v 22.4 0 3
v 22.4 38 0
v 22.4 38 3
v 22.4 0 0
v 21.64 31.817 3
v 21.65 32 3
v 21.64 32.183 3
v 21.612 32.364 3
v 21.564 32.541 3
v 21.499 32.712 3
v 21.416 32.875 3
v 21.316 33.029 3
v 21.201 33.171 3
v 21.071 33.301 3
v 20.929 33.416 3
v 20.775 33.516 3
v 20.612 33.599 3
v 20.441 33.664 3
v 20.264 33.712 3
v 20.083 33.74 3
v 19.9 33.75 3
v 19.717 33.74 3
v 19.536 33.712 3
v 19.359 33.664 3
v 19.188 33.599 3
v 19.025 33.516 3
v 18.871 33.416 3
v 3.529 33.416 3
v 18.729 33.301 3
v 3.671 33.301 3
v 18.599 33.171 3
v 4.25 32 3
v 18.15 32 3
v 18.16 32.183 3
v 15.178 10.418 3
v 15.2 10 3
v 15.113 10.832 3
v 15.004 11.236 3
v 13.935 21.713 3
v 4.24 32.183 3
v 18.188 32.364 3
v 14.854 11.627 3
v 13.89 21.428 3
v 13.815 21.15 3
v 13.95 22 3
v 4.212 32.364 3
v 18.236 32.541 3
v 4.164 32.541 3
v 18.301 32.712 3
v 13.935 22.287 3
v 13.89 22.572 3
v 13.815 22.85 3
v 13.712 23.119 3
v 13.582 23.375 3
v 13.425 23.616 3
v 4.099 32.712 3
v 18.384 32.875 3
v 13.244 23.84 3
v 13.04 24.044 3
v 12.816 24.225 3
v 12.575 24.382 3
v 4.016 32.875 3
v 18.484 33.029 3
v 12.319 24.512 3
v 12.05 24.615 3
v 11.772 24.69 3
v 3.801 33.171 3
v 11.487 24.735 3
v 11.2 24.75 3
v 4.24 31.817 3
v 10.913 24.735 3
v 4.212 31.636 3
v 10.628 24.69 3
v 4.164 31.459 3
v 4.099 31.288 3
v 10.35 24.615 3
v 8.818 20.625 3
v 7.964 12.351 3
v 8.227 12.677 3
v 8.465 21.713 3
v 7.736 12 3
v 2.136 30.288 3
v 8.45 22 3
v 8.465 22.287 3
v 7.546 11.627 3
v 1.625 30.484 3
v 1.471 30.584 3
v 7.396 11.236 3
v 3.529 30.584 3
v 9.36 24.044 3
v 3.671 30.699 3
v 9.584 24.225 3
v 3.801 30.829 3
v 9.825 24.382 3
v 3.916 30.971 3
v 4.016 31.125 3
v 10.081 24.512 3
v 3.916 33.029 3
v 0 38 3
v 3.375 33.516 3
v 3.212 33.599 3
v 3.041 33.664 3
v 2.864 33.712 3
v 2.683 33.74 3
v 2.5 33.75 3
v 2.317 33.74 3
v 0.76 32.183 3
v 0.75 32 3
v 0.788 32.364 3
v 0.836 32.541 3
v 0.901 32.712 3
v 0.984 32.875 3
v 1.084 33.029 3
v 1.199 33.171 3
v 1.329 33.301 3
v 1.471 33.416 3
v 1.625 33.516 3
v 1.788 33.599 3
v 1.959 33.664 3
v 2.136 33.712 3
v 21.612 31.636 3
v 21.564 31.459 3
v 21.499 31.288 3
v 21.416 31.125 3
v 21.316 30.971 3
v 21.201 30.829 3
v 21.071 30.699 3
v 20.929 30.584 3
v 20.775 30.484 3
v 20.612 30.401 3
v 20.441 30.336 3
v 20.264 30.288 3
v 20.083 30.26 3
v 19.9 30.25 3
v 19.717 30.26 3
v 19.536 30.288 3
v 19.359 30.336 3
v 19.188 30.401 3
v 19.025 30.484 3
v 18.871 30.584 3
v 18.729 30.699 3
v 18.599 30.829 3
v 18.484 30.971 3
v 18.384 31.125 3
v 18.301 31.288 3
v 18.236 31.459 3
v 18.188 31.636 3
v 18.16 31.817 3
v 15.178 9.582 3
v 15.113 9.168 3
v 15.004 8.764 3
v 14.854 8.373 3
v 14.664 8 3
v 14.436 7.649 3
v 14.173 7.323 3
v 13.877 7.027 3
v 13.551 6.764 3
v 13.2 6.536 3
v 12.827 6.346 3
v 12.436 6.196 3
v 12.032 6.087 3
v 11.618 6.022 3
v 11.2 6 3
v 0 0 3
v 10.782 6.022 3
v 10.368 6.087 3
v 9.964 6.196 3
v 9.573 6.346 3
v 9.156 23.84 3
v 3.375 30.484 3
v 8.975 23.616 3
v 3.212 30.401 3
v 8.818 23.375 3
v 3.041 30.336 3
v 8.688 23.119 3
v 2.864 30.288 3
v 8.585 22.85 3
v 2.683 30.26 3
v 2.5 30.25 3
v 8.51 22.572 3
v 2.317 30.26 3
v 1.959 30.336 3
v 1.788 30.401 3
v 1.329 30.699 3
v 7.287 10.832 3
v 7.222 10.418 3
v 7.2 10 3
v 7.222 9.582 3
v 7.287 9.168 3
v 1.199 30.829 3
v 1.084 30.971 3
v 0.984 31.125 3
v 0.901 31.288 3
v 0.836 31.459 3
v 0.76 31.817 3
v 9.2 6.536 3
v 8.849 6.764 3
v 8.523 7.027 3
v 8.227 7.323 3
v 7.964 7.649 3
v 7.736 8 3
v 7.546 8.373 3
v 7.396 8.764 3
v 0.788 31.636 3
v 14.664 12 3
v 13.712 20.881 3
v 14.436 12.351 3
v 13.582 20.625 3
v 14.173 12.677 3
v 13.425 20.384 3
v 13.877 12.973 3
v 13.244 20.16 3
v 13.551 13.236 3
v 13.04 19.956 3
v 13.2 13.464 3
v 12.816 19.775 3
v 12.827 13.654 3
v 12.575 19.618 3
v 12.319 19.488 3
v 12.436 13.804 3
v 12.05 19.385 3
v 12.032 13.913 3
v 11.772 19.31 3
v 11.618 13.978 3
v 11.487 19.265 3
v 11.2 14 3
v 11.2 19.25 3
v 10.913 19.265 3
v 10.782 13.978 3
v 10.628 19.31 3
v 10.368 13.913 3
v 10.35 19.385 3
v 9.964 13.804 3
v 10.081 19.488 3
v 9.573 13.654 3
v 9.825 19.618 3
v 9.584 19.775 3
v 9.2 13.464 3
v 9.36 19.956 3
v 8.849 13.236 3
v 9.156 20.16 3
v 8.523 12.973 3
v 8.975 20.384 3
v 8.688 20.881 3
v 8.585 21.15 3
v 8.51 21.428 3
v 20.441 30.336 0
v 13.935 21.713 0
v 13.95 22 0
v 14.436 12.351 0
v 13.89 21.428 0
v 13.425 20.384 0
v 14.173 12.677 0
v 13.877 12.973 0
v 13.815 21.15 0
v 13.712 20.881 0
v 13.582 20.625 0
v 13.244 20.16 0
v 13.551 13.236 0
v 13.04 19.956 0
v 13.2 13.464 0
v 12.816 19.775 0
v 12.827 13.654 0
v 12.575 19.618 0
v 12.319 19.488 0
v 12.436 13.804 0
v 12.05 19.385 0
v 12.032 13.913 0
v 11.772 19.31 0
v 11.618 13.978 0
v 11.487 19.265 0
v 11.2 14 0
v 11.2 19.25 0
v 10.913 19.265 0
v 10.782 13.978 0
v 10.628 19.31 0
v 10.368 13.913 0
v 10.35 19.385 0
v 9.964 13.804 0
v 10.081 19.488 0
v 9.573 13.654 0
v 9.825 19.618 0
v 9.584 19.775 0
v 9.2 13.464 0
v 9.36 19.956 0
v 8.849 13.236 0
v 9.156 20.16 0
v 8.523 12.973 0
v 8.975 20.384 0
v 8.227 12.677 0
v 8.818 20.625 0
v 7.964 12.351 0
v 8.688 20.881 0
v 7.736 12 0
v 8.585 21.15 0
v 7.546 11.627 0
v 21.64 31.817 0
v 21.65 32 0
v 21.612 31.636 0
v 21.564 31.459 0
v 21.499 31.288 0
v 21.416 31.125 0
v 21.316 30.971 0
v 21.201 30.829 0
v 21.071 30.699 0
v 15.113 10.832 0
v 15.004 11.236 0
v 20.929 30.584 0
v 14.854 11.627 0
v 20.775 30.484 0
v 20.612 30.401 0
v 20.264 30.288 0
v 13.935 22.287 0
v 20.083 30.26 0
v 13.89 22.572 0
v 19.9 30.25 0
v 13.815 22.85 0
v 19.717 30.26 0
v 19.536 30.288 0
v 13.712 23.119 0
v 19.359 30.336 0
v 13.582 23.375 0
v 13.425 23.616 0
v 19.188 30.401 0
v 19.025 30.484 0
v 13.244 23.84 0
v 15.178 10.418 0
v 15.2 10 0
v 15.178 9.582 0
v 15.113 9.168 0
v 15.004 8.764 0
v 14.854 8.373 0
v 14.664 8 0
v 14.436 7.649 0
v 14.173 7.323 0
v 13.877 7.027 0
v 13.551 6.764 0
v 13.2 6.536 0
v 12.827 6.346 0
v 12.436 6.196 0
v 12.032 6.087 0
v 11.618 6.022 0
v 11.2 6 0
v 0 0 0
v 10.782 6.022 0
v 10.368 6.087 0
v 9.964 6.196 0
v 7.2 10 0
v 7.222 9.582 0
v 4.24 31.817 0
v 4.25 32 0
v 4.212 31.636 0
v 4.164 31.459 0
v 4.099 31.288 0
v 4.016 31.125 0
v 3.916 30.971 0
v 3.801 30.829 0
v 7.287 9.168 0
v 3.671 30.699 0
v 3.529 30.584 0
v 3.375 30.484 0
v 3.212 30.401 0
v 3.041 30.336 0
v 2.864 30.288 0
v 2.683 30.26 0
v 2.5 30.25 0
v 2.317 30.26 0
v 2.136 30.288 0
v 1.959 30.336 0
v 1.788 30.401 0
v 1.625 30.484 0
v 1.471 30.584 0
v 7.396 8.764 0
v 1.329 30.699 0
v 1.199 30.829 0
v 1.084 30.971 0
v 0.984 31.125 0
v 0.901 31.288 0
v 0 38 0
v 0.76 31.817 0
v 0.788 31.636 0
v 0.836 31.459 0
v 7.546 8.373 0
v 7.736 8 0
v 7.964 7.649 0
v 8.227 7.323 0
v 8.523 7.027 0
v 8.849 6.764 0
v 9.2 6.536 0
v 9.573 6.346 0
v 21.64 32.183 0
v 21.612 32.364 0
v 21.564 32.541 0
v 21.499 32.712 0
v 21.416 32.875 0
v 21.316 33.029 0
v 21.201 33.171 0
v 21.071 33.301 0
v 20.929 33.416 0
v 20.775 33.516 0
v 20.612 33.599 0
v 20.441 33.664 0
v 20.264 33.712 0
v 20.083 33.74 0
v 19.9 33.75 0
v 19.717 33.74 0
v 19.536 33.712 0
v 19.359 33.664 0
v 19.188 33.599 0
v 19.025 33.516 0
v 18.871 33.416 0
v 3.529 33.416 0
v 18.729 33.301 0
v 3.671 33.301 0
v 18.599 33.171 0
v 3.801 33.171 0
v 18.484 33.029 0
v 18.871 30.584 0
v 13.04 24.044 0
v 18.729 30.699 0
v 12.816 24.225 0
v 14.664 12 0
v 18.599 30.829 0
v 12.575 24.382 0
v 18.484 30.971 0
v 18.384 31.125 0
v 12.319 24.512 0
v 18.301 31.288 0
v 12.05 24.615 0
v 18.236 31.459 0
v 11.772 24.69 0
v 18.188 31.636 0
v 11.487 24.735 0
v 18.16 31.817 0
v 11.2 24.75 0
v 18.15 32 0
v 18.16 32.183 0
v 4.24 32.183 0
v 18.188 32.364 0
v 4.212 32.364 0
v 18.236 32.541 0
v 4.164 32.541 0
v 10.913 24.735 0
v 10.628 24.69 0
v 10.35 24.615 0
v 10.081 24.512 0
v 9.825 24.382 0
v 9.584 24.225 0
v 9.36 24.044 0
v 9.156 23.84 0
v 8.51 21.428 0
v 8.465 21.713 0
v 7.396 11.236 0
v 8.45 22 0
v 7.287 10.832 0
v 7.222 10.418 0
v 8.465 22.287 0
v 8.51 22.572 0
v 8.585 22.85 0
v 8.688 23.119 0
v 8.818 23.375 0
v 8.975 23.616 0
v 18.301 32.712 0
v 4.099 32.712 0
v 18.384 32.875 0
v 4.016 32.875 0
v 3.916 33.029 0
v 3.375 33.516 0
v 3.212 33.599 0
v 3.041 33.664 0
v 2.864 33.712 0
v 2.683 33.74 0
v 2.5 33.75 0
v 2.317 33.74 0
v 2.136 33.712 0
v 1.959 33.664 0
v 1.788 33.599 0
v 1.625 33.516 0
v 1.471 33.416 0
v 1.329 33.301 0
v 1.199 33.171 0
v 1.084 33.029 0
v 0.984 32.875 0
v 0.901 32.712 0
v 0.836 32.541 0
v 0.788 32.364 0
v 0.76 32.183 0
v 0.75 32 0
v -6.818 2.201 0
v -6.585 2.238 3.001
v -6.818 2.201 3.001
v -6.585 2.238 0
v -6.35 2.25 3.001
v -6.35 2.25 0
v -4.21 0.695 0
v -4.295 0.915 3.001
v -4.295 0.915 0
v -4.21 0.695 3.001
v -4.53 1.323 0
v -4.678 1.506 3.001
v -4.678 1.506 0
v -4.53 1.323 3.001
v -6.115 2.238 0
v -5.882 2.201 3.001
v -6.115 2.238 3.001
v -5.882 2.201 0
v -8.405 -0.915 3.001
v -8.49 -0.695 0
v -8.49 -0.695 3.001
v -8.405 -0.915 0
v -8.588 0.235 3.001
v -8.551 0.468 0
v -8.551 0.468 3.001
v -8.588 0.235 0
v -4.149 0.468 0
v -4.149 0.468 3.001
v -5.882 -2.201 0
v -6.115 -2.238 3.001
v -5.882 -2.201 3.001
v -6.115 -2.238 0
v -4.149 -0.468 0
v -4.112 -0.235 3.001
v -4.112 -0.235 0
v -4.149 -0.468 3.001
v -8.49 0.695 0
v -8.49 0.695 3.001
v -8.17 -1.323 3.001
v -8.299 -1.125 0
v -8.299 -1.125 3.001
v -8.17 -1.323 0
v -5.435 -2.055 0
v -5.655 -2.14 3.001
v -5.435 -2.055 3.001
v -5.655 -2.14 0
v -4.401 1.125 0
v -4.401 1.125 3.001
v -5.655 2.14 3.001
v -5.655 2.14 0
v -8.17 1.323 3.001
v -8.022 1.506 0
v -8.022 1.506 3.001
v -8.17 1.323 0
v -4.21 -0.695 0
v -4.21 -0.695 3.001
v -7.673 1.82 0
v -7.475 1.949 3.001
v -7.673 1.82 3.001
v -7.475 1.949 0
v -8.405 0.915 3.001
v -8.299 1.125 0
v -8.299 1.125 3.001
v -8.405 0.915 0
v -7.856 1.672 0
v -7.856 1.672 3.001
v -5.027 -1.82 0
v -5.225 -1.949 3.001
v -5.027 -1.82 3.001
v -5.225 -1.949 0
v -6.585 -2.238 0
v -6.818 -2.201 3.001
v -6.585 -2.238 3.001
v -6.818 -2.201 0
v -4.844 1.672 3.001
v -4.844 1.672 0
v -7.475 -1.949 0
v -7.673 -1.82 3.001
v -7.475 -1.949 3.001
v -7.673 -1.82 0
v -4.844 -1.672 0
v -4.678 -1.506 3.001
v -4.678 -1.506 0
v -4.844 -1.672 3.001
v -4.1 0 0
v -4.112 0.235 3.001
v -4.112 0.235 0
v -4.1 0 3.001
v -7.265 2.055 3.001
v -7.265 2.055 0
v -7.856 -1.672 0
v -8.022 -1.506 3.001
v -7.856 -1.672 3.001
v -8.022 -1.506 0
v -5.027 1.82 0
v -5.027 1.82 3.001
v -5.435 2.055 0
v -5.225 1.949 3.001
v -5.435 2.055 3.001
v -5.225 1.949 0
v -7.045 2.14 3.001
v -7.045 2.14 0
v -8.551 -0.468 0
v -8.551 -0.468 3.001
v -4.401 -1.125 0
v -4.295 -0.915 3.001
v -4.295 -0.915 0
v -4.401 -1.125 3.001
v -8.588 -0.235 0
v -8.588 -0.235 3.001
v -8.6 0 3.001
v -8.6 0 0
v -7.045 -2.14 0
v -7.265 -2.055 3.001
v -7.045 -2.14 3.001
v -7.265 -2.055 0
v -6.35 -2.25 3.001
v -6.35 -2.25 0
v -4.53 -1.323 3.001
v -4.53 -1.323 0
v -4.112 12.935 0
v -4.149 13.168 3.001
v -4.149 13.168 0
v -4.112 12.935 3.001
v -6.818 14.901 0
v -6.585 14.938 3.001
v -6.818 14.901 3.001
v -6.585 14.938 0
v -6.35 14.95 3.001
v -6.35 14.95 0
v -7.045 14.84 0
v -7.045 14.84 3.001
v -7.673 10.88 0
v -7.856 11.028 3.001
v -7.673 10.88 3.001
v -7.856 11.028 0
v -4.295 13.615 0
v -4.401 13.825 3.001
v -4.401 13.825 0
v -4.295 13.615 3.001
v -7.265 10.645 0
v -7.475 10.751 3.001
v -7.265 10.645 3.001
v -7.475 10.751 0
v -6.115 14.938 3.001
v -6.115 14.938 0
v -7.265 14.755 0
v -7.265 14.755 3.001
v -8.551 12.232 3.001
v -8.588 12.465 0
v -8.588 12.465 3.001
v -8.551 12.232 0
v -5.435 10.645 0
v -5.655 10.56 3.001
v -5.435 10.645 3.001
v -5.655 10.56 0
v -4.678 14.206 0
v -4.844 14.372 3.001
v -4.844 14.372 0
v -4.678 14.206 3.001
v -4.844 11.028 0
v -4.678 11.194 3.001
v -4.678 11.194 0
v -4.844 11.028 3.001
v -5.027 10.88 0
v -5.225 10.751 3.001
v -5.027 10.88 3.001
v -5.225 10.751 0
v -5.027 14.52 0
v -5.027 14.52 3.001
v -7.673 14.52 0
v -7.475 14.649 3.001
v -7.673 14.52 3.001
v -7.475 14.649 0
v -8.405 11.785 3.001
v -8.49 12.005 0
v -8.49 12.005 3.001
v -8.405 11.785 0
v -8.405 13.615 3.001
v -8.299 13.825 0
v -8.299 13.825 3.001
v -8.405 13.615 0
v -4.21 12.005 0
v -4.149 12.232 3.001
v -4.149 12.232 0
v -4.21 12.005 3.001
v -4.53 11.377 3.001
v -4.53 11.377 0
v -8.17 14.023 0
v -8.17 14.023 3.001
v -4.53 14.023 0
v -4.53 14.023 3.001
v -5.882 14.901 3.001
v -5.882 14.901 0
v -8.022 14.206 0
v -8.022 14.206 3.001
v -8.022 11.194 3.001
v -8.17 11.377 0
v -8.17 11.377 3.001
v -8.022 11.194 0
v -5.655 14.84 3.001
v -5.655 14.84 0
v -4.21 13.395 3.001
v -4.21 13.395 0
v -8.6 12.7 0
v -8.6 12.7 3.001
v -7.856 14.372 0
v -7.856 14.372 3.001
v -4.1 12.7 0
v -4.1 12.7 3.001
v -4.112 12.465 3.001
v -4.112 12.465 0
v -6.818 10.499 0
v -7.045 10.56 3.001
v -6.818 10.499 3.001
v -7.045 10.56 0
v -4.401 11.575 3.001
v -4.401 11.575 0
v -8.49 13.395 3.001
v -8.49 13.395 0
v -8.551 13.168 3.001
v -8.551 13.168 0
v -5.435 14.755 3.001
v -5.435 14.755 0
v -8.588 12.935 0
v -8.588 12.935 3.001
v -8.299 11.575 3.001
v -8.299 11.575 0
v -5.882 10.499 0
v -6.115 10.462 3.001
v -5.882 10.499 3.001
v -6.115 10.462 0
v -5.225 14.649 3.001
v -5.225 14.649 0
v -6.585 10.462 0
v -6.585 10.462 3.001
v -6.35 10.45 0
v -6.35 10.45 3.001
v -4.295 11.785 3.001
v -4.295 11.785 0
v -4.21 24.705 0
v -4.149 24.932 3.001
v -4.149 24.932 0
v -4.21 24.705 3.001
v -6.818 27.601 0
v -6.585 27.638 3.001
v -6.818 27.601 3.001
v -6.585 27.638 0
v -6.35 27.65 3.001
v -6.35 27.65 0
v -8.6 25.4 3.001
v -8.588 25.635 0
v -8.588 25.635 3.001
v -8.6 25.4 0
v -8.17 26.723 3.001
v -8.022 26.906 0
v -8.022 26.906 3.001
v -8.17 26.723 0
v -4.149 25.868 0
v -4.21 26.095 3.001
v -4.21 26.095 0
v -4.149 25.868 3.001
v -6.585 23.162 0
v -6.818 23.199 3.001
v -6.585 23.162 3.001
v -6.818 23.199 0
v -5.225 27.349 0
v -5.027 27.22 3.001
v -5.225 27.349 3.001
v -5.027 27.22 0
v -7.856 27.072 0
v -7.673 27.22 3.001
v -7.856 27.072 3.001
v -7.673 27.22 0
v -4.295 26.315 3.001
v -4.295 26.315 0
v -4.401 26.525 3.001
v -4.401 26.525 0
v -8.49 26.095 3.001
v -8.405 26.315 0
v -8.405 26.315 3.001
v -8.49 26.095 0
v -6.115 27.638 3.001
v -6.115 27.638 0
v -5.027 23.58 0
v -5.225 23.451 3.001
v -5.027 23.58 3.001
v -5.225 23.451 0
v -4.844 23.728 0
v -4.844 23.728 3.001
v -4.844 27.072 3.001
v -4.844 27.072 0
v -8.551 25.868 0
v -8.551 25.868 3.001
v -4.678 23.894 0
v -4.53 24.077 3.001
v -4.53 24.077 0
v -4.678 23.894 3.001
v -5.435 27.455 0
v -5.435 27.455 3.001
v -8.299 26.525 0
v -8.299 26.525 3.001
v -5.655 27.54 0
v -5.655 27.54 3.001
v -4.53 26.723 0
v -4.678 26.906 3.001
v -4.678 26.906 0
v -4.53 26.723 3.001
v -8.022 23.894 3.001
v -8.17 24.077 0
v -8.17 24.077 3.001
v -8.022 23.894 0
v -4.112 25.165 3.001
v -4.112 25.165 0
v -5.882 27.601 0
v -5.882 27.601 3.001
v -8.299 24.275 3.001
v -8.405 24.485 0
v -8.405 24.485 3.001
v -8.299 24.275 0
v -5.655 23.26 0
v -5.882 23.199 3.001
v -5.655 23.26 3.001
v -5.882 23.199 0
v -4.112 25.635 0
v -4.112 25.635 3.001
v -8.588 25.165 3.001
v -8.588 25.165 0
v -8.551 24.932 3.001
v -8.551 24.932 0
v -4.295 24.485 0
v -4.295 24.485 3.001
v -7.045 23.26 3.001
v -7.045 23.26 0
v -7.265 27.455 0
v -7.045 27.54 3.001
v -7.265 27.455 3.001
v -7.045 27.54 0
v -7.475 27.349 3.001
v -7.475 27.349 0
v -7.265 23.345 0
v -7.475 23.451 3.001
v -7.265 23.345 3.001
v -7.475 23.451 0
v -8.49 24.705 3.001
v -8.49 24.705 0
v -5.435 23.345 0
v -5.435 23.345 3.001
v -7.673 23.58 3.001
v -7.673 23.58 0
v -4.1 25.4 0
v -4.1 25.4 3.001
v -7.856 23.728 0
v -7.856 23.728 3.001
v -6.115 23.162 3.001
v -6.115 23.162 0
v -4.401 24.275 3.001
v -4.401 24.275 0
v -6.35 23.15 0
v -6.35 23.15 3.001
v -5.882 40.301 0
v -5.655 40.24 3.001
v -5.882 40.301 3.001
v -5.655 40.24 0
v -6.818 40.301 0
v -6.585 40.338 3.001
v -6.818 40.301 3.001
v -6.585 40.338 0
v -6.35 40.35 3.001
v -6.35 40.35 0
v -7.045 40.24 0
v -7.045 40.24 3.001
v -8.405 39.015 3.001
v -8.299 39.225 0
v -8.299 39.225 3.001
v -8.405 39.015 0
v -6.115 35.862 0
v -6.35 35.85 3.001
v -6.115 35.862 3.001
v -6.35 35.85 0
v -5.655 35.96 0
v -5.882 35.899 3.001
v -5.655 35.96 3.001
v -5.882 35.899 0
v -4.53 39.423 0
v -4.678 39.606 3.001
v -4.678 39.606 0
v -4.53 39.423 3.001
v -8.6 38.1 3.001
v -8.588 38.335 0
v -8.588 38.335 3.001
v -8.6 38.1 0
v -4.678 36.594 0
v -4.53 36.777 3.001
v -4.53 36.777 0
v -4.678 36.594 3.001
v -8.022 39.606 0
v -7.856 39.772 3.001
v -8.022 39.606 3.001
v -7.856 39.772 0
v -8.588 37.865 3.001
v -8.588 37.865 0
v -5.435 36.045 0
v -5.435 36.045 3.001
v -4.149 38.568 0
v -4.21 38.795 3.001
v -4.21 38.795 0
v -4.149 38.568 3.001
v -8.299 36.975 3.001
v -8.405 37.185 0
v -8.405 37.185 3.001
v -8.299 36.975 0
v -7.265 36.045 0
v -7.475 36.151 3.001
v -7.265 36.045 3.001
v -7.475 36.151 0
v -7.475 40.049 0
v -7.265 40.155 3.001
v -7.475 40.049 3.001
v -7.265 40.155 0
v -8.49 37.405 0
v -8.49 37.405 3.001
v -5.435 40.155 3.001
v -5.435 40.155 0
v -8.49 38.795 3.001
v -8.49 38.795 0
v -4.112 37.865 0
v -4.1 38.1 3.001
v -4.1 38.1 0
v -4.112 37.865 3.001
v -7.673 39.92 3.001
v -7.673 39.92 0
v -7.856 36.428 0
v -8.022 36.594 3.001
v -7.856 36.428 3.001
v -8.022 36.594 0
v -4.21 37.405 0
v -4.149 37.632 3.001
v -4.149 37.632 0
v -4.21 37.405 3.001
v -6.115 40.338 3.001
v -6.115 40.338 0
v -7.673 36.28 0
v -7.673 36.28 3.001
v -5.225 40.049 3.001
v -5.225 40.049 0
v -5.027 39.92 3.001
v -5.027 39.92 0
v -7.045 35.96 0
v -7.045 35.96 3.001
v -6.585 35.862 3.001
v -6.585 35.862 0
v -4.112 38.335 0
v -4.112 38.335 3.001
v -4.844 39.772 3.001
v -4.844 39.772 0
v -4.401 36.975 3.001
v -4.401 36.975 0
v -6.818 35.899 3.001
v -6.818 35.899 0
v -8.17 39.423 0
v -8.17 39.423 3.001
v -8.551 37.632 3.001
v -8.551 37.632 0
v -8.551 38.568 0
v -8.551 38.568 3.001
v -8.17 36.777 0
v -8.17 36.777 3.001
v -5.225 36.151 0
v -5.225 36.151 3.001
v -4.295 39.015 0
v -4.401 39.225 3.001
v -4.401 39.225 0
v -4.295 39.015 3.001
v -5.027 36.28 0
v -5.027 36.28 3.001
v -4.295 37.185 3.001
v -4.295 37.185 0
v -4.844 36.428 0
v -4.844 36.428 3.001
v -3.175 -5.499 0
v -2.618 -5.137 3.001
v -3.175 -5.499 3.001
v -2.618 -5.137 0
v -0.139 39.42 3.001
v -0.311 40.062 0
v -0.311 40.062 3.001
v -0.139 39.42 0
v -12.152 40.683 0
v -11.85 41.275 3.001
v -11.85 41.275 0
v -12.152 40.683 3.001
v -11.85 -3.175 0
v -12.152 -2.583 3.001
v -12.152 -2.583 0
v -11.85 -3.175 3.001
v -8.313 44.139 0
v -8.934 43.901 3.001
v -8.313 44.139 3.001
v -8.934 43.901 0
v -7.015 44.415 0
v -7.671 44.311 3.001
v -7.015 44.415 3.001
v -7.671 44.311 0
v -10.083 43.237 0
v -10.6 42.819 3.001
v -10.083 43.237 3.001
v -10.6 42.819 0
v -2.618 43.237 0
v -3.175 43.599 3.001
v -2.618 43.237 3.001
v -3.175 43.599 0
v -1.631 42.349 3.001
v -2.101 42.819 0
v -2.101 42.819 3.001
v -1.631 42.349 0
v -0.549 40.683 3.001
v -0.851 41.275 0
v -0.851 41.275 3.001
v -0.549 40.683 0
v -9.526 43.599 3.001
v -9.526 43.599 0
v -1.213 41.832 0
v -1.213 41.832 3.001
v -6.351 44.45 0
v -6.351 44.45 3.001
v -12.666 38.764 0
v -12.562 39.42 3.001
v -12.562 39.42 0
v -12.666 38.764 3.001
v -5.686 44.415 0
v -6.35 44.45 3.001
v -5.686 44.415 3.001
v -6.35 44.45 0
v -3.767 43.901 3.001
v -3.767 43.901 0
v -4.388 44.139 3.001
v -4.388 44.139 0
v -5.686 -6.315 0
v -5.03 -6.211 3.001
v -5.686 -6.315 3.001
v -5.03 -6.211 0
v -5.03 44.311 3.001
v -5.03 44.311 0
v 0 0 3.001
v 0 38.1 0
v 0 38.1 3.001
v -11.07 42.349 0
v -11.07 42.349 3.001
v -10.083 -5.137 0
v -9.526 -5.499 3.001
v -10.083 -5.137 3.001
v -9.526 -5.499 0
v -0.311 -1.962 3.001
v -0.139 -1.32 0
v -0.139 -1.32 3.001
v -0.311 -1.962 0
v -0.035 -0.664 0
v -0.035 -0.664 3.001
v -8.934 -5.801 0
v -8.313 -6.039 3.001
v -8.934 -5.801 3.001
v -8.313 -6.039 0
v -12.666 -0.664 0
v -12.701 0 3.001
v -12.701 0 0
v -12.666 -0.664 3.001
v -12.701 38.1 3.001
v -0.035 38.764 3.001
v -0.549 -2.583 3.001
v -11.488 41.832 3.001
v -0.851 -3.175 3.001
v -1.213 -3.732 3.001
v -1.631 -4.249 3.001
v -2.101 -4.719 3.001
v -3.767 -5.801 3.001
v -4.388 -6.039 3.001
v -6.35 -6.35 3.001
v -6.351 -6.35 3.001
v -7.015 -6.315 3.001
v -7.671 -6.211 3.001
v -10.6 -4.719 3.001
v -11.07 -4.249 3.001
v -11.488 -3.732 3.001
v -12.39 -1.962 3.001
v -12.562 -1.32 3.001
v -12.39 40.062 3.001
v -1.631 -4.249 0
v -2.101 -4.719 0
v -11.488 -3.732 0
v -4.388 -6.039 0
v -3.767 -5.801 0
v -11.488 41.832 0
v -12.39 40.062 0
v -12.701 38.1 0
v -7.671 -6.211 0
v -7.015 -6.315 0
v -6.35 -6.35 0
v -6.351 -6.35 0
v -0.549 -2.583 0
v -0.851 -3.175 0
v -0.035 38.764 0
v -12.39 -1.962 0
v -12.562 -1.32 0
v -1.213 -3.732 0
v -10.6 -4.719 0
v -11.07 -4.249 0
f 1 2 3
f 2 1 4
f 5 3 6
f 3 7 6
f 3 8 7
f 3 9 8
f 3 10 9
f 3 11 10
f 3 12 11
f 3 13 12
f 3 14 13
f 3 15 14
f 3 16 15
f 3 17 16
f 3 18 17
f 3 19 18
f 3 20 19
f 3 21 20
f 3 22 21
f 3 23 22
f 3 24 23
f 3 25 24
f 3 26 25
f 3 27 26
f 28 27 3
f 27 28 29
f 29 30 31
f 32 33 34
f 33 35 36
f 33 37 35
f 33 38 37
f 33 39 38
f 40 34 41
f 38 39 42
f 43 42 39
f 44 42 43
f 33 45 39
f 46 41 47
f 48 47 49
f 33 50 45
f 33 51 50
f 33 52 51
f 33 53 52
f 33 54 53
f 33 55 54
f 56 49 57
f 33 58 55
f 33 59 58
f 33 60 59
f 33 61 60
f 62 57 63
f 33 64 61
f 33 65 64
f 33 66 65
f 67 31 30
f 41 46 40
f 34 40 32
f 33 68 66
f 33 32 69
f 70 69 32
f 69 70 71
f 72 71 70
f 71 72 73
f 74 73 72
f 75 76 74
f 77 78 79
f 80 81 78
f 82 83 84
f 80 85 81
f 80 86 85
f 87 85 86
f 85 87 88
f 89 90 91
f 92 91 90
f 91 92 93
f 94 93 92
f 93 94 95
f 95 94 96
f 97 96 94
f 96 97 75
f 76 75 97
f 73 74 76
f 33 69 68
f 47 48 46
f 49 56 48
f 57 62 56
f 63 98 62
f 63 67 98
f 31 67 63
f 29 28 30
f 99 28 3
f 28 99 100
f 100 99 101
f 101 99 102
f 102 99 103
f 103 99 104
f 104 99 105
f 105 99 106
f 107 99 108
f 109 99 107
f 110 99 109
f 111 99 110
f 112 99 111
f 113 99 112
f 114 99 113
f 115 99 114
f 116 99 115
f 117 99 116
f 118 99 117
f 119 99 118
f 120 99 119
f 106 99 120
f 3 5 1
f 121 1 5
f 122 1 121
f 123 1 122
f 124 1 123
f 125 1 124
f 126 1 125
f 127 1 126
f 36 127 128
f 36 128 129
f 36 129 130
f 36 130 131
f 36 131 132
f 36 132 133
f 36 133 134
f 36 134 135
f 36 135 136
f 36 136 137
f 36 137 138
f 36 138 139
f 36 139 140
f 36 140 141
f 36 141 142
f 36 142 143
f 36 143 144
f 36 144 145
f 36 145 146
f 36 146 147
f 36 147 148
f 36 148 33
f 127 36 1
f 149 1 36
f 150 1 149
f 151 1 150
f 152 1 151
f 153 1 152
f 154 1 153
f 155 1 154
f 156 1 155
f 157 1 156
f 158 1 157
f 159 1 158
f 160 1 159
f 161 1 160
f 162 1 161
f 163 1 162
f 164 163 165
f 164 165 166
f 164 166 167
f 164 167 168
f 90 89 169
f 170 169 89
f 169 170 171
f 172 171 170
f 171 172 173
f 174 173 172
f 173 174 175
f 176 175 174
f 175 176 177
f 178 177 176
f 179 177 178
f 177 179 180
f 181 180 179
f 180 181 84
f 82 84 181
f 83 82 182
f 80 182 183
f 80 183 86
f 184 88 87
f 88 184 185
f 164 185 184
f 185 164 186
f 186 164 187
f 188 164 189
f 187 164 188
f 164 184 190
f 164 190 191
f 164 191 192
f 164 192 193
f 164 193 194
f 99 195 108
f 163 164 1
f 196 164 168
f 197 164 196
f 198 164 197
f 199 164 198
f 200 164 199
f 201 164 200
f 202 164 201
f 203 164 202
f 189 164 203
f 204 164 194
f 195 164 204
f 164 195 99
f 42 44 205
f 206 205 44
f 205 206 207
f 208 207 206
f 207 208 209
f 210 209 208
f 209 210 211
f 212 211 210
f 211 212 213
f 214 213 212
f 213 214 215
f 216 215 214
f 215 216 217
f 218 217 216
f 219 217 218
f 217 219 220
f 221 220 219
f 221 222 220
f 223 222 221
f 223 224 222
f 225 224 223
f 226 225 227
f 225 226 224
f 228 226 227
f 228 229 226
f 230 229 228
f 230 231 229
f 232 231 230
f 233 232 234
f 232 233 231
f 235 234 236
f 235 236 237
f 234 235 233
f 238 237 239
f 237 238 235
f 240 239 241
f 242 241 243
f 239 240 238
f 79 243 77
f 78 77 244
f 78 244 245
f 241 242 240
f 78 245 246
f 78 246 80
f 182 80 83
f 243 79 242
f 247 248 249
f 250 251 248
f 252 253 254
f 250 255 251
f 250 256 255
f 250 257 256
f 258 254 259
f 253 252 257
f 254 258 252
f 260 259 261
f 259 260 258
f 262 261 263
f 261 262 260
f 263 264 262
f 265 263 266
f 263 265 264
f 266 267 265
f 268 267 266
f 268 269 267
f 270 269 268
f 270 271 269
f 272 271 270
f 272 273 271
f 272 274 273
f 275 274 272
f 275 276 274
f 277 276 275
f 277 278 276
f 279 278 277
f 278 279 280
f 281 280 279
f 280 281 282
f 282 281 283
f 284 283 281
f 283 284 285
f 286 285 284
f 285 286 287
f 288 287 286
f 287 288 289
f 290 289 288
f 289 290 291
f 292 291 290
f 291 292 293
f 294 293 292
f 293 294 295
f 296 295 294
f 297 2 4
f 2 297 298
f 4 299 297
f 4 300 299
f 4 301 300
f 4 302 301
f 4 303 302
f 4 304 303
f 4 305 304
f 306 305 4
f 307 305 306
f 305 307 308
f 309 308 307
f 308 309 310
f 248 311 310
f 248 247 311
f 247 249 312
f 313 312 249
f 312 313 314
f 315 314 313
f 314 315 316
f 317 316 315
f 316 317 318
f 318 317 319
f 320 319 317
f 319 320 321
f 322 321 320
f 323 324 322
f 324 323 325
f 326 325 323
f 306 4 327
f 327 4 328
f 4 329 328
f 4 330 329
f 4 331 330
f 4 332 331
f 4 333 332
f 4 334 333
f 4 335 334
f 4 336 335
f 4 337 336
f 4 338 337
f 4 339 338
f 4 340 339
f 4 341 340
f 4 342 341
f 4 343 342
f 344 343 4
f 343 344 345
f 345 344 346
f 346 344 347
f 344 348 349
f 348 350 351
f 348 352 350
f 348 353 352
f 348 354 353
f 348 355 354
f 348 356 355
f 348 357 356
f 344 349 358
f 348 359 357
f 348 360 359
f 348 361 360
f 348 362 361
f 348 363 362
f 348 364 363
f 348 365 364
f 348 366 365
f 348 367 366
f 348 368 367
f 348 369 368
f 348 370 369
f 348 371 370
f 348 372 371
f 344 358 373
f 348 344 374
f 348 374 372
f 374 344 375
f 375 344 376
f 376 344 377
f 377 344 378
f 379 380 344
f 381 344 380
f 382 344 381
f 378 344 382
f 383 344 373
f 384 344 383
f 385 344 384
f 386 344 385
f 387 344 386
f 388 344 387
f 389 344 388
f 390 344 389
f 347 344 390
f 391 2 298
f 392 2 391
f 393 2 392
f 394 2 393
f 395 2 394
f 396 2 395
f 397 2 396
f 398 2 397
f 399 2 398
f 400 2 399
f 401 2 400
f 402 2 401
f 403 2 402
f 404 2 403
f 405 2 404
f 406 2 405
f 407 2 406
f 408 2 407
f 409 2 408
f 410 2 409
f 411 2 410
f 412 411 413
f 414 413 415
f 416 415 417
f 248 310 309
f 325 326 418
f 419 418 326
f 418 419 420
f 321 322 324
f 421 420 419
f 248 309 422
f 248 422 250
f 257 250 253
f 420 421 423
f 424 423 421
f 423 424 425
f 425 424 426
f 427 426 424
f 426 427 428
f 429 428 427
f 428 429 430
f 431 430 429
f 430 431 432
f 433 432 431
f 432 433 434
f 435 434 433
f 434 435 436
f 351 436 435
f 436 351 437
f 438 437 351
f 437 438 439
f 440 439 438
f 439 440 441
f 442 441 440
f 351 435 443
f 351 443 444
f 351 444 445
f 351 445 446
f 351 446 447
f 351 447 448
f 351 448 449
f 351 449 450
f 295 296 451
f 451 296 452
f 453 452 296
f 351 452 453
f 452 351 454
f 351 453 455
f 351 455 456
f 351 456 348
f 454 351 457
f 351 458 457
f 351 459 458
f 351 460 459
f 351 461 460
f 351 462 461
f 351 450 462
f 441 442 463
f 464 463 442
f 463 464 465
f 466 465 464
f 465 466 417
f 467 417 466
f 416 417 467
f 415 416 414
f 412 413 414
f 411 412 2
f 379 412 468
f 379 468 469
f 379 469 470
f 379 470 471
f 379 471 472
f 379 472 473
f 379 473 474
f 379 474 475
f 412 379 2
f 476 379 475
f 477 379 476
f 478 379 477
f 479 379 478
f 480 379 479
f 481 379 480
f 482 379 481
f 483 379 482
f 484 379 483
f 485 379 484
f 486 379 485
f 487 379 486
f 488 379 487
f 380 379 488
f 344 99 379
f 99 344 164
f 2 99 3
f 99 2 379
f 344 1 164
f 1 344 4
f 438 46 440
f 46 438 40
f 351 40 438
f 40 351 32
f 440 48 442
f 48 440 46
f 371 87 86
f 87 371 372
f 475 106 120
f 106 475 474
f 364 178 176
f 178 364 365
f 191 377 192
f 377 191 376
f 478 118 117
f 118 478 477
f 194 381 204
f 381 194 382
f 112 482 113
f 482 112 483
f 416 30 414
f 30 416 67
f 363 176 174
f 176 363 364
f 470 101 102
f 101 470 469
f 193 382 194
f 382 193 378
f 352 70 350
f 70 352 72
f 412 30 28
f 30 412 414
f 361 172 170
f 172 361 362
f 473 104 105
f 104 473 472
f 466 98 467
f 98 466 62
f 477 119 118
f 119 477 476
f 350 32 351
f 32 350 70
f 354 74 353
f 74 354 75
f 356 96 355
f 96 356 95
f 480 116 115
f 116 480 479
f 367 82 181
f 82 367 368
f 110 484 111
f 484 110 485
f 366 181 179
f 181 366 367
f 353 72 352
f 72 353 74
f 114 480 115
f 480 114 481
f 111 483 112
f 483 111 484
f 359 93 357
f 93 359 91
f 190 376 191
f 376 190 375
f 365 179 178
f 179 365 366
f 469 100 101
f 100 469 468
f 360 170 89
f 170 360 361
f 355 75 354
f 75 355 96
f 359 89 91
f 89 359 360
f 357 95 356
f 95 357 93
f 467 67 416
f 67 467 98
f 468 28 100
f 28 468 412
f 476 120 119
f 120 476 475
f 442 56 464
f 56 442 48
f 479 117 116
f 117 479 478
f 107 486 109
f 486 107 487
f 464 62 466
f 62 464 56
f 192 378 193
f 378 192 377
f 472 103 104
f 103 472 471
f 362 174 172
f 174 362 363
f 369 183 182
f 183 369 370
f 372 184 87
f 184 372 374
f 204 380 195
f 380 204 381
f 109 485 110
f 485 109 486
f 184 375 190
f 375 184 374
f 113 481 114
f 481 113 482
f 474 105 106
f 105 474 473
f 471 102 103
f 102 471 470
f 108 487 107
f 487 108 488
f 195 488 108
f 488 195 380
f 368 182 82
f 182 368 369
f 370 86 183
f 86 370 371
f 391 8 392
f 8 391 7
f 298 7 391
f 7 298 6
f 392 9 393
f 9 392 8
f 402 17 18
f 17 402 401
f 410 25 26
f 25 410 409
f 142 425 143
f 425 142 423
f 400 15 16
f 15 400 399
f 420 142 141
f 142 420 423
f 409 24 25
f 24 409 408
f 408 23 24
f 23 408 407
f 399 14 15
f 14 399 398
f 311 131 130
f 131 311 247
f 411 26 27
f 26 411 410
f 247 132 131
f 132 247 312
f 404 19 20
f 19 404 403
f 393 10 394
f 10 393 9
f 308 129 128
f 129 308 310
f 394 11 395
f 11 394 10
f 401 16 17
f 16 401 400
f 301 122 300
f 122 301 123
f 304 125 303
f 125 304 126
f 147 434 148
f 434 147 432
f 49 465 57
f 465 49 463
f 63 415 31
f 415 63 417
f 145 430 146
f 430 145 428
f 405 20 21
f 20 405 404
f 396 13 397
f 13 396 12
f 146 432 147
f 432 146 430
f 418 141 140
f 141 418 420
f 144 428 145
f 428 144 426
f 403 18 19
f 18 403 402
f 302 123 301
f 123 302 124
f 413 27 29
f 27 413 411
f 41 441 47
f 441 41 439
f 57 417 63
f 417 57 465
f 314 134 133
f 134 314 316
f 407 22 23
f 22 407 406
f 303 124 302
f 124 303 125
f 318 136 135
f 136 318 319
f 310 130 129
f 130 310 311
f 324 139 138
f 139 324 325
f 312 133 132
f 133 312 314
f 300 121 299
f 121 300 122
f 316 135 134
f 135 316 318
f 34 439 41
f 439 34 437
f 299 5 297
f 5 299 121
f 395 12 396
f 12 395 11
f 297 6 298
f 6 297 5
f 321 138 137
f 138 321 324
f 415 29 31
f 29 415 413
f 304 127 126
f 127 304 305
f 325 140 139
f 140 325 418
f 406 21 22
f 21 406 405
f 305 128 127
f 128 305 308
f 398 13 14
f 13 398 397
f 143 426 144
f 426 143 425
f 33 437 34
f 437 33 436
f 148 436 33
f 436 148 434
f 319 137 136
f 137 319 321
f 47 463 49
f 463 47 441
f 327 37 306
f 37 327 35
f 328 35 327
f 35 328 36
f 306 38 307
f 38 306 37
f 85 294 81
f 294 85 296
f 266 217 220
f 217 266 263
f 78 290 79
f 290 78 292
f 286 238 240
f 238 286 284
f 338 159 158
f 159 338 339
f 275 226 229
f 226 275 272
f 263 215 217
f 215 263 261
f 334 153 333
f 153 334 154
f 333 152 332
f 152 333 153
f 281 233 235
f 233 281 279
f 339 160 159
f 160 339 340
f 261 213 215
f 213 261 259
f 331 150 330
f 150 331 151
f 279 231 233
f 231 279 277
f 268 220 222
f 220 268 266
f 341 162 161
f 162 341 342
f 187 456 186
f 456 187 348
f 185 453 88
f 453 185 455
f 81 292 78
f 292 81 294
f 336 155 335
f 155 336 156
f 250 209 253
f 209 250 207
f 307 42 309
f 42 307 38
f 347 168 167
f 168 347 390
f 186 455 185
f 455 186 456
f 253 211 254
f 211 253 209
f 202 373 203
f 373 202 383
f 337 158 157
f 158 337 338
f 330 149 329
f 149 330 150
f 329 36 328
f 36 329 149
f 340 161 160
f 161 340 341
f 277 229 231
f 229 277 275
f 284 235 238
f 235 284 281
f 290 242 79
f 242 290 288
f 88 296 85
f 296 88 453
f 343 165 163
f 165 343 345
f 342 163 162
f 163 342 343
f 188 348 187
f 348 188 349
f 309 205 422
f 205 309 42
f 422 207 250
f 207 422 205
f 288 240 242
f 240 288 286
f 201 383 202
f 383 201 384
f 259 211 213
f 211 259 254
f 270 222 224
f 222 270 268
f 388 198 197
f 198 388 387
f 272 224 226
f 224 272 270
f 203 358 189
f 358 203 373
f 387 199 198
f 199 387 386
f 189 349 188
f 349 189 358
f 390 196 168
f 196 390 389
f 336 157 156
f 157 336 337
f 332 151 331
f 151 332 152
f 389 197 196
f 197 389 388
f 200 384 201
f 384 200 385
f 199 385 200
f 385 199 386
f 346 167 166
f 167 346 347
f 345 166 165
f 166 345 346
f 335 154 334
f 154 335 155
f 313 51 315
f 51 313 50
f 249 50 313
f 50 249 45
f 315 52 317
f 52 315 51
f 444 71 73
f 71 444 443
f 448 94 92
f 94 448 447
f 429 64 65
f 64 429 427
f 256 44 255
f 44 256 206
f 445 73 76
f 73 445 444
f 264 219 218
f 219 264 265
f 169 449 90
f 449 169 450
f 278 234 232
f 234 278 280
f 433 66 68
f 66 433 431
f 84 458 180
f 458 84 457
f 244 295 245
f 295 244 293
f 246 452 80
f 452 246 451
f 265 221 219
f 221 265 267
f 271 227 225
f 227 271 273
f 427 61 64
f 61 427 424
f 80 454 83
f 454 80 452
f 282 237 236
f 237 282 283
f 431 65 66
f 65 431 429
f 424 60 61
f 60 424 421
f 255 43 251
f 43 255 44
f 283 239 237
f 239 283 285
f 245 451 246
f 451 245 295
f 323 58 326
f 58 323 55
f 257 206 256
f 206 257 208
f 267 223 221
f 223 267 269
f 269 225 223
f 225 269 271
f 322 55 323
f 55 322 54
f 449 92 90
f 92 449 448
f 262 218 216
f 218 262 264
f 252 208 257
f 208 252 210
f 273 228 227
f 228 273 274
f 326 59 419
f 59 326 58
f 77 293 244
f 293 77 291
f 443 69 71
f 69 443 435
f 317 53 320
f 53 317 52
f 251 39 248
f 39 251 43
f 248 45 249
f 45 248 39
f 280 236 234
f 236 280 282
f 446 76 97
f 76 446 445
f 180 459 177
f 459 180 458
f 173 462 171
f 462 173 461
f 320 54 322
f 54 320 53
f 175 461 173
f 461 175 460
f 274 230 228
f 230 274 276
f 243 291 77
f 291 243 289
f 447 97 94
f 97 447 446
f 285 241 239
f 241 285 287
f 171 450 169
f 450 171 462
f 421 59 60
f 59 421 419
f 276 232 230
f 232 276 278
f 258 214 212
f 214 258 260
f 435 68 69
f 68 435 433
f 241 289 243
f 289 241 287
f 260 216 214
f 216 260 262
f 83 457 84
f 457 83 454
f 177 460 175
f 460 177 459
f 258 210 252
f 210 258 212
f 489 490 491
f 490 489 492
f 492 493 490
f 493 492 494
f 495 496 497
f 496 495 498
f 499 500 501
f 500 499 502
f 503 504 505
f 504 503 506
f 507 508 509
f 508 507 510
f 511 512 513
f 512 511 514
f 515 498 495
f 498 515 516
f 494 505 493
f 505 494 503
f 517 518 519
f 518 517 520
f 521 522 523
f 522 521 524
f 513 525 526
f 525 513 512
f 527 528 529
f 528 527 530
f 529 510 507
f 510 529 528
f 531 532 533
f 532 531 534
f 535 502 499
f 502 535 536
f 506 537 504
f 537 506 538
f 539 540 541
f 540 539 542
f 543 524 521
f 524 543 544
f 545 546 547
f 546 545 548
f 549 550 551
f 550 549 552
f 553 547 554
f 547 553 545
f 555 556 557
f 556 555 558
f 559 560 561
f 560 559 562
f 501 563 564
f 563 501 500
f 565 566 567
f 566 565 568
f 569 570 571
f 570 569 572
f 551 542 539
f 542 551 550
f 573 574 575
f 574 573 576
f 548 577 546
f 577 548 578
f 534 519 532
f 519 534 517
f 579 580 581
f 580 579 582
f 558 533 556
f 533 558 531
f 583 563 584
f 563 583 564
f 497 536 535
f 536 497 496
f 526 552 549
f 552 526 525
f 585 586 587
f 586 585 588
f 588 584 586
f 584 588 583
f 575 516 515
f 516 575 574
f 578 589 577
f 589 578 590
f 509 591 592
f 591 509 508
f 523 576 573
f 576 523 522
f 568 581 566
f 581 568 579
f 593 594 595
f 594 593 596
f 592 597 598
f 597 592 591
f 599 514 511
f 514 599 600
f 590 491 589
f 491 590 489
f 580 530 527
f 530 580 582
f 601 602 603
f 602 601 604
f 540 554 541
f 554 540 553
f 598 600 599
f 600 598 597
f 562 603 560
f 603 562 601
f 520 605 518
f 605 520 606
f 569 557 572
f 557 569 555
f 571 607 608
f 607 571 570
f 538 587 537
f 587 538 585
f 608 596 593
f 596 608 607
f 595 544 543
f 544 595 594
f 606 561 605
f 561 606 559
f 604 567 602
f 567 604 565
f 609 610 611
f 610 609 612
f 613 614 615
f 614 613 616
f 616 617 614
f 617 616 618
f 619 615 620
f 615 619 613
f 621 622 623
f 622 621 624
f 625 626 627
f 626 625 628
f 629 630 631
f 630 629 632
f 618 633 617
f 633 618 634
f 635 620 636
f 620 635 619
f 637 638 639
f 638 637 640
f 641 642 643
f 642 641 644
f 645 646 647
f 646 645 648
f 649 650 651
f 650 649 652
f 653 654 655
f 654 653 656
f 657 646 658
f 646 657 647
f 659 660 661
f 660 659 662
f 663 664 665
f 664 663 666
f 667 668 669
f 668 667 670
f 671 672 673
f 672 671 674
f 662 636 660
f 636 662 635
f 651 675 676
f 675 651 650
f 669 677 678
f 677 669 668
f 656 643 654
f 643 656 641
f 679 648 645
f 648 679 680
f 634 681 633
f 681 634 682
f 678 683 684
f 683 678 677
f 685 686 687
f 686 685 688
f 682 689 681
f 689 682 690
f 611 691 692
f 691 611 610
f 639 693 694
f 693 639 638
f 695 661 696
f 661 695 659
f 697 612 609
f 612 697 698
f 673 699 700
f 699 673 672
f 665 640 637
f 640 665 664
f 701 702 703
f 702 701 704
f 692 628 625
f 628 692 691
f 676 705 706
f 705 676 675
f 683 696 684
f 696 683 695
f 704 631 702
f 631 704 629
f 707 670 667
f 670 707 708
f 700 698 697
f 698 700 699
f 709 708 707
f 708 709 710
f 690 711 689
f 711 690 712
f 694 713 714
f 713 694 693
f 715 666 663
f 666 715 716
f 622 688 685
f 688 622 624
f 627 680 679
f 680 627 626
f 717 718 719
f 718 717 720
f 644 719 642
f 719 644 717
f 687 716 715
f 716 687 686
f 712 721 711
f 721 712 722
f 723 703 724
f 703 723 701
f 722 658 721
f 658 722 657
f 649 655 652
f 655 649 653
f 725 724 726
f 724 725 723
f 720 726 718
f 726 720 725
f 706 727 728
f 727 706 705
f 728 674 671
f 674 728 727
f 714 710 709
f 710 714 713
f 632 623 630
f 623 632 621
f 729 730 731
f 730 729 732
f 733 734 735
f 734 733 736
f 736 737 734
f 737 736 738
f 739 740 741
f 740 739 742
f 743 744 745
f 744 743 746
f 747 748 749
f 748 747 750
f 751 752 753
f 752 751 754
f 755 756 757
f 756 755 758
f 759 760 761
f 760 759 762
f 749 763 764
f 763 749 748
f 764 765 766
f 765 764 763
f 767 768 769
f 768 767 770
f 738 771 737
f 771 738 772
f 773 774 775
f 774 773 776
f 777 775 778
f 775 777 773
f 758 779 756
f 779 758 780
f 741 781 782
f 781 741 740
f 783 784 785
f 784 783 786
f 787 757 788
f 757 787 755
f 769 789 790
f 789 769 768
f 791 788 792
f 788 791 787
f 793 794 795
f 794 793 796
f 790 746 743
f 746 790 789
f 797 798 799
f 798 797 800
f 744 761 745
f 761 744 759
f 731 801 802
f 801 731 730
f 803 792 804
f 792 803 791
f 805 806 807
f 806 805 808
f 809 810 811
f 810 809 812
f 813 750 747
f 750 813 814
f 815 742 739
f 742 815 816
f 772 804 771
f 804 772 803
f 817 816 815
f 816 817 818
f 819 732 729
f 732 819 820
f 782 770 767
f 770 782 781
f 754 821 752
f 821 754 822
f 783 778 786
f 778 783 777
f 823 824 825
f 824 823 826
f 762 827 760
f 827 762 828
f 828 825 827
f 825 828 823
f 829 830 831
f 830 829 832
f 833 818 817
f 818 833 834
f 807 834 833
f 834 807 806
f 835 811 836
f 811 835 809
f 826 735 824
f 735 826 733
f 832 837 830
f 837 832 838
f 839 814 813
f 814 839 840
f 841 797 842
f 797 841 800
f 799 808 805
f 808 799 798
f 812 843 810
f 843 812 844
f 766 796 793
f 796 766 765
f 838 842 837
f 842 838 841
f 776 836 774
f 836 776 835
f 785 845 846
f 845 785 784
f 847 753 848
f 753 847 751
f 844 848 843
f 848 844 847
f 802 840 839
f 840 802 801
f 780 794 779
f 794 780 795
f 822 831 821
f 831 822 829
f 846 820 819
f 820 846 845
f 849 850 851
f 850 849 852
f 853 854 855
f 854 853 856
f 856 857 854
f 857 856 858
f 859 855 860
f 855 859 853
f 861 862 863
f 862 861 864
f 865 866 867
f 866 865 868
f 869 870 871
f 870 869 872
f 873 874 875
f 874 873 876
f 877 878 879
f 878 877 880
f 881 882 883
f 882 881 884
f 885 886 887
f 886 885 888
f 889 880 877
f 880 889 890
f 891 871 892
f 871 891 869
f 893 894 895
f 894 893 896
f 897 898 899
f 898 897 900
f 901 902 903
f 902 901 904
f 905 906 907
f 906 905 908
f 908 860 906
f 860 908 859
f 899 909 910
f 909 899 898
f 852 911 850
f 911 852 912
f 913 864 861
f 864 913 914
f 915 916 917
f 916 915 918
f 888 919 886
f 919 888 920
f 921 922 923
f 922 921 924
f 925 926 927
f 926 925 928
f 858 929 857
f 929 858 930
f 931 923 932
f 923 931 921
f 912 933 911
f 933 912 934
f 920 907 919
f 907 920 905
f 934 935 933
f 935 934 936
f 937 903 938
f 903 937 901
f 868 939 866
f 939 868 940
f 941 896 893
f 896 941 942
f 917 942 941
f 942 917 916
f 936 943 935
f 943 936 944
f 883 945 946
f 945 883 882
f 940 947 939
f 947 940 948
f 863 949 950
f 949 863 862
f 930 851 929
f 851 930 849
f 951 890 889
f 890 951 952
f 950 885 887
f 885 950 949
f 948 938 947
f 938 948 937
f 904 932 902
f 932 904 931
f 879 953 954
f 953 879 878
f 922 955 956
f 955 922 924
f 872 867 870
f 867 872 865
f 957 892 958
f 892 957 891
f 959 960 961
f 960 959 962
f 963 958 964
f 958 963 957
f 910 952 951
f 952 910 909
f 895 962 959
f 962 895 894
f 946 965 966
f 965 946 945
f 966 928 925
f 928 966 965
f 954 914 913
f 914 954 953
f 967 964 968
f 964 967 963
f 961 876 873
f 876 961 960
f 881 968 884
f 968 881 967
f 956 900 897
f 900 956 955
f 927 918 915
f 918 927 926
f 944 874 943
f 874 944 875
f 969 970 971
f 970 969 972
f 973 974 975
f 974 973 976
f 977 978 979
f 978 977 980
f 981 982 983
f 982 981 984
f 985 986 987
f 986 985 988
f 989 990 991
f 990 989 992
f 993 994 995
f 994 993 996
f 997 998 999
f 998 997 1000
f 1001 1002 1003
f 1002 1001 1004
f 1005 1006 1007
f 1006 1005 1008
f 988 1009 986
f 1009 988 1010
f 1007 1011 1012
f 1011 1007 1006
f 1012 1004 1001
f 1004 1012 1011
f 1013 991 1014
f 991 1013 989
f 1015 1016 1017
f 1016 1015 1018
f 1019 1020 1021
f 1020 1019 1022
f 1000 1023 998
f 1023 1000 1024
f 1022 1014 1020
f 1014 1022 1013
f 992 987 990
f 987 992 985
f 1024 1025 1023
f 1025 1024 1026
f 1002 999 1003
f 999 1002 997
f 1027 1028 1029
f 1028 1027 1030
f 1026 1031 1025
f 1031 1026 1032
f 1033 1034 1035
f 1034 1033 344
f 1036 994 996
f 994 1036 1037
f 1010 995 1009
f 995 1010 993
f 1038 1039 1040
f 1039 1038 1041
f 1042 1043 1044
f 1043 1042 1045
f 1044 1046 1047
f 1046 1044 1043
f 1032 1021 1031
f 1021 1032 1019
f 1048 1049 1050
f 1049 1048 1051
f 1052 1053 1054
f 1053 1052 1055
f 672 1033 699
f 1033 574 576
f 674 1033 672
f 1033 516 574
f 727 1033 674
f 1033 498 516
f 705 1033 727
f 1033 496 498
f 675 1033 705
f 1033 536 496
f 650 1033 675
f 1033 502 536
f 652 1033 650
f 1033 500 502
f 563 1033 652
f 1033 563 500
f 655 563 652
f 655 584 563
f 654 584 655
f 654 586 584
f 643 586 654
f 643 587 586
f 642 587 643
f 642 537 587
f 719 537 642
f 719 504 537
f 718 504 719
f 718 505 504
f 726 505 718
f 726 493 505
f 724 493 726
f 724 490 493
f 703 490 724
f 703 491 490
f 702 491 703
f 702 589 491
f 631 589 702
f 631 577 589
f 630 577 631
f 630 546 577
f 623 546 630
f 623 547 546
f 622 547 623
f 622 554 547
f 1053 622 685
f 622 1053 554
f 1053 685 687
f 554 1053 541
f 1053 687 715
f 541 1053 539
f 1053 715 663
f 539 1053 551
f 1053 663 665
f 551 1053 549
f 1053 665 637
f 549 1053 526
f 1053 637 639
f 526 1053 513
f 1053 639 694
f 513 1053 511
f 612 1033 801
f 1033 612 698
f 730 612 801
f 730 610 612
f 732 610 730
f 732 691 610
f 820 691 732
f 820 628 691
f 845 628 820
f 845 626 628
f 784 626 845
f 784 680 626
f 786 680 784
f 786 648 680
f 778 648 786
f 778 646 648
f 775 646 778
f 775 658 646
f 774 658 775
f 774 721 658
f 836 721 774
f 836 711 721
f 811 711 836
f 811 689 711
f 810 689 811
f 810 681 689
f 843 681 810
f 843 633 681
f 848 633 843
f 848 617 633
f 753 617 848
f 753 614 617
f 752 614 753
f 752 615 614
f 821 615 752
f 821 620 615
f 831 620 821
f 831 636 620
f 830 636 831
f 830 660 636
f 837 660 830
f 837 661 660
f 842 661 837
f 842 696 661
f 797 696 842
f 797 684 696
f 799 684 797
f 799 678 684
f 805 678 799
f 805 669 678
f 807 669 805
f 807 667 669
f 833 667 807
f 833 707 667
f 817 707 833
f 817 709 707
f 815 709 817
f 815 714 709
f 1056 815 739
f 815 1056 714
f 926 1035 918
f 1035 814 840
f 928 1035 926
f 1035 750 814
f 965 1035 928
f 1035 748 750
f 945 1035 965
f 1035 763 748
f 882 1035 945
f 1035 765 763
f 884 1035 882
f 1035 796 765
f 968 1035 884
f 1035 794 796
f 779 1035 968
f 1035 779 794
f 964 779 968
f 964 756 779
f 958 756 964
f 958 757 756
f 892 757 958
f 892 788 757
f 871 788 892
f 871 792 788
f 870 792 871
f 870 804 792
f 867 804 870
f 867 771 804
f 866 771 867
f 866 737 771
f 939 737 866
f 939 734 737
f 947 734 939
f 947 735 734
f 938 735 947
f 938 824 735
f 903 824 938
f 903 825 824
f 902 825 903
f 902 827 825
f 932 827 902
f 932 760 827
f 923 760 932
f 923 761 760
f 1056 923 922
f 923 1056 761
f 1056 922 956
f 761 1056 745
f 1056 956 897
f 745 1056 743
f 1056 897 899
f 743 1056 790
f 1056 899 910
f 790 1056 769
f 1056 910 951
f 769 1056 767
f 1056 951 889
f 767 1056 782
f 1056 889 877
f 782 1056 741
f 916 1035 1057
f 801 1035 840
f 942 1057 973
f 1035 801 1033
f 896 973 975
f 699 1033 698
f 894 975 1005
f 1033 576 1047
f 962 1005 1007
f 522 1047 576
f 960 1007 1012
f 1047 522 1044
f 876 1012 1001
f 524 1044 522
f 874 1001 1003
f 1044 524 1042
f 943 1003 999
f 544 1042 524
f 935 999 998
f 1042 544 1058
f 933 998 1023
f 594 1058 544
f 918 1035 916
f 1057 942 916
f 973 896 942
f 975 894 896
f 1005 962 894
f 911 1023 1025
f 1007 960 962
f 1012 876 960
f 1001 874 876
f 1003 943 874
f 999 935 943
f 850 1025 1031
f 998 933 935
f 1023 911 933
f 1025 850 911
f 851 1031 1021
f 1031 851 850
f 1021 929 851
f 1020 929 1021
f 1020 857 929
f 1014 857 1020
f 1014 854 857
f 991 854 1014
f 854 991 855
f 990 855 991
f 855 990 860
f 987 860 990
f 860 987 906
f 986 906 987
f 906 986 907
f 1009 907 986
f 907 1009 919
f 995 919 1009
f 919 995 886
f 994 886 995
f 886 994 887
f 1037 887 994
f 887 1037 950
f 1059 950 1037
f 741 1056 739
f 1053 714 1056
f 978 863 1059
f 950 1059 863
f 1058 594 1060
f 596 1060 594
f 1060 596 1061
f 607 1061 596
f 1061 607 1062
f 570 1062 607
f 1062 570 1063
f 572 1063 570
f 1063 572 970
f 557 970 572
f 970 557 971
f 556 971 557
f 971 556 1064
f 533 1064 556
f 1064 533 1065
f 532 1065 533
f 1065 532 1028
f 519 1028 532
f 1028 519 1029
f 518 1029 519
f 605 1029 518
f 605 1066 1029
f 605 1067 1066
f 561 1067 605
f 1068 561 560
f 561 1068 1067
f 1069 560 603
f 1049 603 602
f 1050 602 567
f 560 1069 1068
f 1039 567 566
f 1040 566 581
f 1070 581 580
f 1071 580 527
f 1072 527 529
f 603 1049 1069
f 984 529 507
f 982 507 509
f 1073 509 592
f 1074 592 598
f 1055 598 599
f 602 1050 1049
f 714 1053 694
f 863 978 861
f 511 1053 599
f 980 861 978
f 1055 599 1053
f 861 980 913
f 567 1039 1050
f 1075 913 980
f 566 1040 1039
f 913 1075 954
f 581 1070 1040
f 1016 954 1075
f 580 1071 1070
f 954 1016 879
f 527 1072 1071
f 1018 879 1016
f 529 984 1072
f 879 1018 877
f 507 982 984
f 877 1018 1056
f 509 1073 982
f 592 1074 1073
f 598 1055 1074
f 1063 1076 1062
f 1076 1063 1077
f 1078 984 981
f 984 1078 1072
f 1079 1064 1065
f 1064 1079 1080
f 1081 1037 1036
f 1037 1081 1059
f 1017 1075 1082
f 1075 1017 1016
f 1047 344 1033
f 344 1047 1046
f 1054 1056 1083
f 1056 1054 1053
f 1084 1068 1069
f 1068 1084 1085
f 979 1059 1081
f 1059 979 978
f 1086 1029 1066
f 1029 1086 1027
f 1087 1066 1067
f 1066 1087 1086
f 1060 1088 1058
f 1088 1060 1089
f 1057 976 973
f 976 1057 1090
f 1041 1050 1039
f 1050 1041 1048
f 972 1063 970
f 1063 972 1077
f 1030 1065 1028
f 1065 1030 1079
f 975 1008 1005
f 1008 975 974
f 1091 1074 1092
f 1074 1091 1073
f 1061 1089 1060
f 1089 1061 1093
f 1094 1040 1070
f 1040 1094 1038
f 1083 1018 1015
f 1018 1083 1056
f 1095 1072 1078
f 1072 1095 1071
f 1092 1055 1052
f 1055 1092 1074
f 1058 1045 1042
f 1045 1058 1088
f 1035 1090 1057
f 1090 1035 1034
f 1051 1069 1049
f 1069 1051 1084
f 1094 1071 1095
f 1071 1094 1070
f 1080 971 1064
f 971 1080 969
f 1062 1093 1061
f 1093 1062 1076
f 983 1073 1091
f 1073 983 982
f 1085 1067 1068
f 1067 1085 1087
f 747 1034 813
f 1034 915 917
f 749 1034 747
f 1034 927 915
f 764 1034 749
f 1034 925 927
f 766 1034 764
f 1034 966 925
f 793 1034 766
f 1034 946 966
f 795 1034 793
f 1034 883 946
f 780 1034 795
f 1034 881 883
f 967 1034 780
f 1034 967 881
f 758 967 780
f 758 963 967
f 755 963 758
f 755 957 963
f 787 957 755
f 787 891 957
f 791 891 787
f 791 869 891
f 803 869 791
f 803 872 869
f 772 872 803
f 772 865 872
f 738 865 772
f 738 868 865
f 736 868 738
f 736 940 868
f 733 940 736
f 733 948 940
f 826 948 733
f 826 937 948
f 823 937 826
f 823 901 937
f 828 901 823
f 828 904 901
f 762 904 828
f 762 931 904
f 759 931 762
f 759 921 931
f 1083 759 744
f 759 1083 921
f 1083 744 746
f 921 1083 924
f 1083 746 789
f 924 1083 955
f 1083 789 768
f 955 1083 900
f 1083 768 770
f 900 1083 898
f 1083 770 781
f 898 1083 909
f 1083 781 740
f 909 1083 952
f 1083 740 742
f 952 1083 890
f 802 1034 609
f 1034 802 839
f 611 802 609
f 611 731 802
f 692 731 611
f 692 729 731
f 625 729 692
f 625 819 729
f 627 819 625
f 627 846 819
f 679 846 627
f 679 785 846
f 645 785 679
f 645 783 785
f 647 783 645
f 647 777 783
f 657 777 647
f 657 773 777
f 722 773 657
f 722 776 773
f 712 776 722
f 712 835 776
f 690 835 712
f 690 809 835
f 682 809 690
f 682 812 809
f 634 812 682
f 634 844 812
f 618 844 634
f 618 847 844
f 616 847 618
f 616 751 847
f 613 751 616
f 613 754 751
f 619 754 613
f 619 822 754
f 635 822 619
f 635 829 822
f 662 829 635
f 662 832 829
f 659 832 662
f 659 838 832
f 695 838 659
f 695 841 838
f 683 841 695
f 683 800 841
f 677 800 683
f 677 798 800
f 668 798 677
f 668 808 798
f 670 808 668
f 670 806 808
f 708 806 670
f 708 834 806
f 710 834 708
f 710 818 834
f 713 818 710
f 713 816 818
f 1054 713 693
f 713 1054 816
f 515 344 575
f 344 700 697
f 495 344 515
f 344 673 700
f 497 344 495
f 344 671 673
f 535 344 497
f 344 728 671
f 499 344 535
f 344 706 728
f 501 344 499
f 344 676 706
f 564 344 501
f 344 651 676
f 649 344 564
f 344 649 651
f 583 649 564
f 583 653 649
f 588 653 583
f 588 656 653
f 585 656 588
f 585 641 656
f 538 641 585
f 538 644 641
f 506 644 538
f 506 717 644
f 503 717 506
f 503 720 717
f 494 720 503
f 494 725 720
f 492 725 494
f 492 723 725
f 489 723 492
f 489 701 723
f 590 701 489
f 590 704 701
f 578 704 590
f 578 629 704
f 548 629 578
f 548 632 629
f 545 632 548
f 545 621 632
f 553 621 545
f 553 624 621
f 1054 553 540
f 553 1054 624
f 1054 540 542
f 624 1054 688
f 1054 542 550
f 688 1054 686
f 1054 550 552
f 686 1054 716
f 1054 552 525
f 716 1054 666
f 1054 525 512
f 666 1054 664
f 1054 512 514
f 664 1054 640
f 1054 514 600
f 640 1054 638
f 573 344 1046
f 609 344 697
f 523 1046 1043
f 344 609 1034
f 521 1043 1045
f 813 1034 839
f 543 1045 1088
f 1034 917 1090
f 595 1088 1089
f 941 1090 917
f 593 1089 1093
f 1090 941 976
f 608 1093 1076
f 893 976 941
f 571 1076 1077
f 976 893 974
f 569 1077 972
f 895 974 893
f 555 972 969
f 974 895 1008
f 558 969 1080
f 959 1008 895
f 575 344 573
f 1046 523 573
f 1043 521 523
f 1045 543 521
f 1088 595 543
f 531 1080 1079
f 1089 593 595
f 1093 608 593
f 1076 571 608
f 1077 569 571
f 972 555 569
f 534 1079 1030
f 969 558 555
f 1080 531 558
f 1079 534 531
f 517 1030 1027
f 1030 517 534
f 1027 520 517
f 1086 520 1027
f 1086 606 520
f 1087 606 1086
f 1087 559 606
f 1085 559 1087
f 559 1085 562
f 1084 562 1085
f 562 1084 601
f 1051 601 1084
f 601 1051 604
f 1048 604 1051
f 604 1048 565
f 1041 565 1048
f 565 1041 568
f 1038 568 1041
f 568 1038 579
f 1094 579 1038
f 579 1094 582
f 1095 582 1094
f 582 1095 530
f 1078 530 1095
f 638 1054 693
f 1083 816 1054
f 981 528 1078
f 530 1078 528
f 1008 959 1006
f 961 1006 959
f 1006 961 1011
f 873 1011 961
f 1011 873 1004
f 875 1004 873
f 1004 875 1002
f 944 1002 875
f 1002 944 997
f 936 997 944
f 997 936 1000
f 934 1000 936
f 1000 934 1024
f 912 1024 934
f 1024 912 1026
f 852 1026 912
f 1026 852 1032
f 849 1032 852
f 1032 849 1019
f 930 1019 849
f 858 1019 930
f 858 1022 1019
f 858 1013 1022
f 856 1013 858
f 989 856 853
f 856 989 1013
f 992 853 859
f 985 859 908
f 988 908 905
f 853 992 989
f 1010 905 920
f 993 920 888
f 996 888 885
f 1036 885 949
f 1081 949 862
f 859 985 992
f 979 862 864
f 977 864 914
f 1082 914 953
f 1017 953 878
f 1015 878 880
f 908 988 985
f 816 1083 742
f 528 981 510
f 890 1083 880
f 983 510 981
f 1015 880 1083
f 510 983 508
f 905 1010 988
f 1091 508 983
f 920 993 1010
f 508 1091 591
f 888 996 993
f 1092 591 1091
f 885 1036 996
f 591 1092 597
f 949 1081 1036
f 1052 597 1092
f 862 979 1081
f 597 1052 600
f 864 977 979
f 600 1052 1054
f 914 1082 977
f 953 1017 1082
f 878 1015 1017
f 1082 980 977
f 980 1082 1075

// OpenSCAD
$fn=60;

difference(){
    cube([22.4,38,3]);
translate([2.5,32,-1])cylinder(d=3.5,h=5);
translate([19.9,32,-1])cylinder(d=3.5,h=5);
translate([11.2,10,-1])cylinder(d=8,h=5);    
translate([11.2,22,-1])cylinder(d=5.5,h=5); }


translate([-6.35,0,0])rotate([0,0,90])
meccano(n=4);
//translate([19.4,13,6.35])rotate([90,0,90])
//meccano(n=4);


module meccano(n=2){
difference(){
    minkowski(){
        cylinder(d=12.7,h=3);
        cube([(n-1)*12.7,.001,0.001]);
    }
    for (i=[0:n-1]){
        translate([i*12.7,0,-1])cylinder(d=4.5,h=5);
    }
}
}
